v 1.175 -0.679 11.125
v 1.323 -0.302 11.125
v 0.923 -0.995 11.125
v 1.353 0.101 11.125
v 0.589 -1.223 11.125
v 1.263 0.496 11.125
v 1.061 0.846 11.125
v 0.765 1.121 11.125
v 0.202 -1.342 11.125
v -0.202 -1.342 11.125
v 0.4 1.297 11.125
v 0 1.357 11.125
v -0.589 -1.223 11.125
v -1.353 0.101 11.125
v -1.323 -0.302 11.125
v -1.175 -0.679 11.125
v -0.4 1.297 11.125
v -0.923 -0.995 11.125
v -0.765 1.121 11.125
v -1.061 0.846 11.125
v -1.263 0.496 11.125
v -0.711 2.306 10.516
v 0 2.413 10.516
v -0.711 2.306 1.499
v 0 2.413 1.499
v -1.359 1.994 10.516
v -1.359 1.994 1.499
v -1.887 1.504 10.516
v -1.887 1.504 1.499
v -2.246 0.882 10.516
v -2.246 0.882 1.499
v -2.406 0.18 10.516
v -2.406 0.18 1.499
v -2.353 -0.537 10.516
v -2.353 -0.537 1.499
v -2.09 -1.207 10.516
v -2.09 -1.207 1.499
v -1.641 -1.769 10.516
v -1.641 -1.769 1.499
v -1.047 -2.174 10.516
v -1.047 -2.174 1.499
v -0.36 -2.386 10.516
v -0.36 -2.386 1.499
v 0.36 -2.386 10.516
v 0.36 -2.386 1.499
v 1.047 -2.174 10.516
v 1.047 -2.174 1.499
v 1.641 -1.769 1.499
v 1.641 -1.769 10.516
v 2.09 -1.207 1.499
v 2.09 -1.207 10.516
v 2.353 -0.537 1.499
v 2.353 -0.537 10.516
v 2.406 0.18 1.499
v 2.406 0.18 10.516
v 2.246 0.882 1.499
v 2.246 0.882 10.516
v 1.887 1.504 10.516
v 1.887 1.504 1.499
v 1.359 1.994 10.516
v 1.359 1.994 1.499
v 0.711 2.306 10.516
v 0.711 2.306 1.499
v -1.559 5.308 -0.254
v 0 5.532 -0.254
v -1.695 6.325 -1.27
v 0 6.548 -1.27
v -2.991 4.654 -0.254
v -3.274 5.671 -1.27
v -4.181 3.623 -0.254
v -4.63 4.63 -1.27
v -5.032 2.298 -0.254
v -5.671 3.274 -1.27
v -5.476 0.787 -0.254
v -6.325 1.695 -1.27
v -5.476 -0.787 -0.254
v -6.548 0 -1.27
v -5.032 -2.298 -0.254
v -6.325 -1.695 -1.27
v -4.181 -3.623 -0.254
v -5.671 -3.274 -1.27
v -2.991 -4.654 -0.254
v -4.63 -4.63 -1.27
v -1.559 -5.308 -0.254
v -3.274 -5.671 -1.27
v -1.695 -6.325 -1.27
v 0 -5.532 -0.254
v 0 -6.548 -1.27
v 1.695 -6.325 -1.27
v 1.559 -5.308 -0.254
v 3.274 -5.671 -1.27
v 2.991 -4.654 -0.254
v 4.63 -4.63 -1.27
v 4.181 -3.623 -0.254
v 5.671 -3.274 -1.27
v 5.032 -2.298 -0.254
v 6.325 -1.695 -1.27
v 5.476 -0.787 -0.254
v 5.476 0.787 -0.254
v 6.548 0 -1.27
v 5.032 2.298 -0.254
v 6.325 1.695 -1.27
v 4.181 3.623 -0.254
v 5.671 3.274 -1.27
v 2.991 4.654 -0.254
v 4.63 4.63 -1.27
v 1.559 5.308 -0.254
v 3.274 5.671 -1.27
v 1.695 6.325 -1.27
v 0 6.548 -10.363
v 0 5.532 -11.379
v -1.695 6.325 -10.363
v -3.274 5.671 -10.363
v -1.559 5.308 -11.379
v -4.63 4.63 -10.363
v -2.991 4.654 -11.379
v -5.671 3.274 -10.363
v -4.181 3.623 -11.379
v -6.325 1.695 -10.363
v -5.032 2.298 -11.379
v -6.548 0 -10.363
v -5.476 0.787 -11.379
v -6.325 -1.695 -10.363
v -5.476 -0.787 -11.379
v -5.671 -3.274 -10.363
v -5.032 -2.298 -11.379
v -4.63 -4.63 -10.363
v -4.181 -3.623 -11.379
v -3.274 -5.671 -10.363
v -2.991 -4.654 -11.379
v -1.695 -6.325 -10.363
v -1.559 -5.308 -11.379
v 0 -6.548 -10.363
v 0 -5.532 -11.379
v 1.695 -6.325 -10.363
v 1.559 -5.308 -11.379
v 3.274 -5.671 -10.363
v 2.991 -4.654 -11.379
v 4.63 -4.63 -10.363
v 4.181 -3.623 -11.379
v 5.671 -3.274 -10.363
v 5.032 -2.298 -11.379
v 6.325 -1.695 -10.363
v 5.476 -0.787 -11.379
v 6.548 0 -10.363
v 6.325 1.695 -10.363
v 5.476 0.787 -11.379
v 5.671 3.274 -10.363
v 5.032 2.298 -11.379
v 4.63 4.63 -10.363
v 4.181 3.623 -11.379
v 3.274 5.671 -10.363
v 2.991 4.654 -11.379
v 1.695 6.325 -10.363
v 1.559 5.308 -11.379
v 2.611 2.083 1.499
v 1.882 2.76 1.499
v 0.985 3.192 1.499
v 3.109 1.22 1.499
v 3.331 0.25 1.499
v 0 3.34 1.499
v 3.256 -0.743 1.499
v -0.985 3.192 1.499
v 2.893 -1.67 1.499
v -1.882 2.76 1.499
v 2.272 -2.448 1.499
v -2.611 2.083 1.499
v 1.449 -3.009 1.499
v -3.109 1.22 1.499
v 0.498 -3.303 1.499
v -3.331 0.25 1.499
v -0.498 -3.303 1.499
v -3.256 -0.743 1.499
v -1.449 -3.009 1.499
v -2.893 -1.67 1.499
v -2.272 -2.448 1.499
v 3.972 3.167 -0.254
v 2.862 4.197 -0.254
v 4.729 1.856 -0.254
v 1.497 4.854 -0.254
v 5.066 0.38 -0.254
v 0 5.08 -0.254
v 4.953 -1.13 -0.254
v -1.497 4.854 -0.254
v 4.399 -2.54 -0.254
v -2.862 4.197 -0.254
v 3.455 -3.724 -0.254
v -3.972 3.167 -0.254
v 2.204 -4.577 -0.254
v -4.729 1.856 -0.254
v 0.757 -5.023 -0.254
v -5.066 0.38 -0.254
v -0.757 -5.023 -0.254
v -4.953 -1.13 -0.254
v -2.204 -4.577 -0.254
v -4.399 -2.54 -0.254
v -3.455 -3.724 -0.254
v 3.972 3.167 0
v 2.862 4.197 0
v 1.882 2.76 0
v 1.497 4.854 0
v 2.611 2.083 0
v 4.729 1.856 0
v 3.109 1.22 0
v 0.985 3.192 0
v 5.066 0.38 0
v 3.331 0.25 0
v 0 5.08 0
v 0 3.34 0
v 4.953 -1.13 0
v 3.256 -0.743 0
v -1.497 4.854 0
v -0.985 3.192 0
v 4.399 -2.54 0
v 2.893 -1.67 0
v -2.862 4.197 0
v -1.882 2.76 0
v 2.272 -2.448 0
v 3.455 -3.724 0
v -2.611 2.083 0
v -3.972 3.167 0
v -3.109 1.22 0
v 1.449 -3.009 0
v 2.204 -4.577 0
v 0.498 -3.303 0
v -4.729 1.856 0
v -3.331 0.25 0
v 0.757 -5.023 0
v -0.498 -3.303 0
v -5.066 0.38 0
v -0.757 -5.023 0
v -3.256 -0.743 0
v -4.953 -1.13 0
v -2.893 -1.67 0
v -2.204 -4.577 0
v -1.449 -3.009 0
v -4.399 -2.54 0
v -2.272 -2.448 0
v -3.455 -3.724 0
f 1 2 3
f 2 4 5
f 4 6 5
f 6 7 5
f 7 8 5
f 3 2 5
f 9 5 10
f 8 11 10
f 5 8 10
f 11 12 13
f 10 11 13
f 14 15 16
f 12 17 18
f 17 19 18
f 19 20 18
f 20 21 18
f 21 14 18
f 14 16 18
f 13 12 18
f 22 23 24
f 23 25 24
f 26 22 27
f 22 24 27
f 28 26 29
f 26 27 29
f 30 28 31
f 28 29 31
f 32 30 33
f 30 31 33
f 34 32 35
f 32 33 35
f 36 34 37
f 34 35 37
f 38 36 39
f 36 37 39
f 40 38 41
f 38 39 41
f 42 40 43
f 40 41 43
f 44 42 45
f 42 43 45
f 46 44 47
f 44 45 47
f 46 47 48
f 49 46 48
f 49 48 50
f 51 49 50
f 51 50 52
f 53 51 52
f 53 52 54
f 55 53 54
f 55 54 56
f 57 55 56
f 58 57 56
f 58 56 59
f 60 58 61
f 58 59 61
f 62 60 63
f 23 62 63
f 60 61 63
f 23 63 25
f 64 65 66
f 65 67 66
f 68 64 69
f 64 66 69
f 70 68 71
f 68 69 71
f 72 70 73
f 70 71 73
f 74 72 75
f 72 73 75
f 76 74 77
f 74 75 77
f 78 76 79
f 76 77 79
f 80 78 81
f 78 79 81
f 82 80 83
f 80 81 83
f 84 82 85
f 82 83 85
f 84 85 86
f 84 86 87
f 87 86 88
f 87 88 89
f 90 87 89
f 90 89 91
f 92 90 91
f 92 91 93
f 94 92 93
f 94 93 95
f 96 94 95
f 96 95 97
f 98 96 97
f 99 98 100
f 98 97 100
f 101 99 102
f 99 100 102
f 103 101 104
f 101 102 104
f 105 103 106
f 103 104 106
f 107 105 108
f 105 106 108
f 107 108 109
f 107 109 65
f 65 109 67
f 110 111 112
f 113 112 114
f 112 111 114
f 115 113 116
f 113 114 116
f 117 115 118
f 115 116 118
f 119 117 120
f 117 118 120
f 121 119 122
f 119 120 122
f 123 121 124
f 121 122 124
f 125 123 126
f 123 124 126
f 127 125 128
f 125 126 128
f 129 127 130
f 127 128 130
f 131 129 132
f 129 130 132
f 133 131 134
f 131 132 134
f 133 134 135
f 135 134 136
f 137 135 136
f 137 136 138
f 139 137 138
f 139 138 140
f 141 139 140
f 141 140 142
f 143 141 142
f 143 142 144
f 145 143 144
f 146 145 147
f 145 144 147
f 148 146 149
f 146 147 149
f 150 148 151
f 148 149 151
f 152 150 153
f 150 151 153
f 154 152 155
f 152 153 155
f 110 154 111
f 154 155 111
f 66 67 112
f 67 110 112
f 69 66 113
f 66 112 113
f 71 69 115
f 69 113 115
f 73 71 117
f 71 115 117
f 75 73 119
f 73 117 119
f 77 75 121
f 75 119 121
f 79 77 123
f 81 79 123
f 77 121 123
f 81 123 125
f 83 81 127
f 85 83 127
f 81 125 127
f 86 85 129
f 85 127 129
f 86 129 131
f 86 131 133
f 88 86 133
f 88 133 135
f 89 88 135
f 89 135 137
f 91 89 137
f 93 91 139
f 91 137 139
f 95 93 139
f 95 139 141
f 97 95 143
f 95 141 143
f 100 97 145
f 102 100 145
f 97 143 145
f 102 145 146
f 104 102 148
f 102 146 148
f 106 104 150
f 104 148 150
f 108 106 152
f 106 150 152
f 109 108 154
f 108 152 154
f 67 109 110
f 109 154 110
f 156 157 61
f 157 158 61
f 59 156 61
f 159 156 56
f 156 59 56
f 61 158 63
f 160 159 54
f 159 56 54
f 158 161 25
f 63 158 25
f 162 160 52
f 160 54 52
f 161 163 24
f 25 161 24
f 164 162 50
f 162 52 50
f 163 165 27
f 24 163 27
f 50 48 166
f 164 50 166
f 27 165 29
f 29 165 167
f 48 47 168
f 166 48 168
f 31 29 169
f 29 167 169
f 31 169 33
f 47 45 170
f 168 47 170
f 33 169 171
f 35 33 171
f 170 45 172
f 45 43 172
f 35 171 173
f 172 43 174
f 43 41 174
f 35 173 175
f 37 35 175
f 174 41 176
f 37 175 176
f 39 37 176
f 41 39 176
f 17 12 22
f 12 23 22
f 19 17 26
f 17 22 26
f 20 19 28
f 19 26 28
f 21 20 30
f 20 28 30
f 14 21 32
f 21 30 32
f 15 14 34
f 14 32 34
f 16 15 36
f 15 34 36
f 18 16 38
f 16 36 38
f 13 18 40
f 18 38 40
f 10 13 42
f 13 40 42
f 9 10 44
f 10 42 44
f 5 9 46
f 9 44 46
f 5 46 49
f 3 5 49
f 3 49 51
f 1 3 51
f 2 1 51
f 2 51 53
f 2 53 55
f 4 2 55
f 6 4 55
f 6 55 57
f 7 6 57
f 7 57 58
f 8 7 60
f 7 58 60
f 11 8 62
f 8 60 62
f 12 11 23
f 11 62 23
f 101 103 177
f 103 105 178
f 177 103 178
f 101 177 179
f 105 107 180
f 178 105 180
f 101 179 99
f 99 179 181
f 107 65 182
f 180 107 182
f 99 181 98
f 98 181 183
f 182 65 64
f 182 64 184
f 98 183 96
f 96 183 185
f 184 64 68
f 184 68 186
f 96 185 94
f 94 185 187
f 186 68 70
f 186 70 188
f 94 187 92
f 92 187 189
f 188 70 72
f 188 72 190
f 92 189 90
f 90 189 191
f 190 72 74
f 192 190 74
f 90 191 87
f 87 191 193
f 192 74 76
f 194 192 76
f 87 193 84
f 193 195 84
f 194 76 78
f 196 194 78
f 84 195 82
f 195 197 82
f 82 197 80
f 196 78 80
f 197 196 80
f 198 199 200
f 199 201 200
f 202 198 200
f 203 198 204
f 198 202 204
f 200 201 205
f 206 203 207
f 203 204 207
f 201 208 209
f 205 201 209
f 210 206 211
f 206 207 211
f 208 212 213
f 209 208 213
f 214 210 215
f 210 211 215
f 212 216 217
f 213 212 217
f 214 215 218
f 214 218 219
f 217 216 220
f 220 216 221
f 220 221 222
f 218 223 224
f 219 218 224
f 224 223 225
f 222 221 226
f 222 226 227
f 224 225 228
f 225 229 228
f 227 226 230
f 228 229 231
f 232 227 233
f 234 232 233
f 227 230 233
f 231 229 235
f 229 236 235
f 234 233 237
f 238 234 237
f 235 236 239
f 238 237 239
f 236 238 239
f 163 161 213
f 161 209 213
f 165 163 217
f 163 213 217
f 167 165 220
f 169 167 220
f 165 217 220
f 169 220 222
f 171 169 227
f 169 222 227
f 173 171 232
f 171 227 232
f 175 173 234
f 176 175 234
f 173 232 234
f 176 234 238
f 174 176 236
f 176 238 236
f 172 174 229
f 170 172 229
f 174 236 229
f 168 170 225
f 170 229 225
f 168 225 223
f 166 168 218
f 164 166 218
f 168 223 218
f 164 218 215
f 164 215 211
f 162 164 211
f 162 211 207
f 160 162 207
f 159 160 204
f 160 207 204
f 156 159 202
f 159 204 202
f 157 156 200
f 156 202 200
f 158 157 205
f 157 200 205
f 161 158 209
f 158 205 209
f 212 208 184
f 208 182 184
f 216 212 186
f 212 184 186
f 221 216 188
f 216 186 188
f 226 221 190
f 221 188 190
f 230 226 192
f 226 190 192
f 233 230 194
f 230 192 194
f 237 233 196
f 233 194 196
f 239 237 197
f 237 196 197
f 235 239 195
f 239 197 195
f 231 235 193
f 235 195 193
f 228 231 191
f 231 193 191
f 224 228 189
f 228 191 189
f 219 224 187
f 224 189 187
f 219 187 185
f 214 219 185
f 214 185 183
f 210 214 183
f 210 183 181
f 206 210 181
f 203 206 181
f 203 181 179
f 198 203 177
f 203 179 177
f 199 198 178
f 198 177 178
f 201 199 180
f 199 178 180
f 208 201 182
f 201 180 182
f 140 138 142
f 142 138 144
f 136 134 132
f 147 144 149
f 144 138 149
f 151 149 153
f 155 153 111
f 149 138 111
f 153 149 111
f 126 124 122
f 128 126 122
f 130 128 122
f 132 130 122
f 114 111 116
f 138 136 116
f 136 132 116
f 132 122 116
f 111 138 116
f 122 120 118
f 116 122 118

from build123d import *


with BuildPart() as part:
    # Sketch1 → Revolve1 (revolve)
    with BuildSketch(Plane(origin=(0, 0, 0), x_dir=(0, 0, -1), z_dir=(1, 0, 0))):
        Polygon((-1.4986, 2.413), (-1.4986, 3.3401), (0, 3.3401), (0, 5.08), (0.254, 5.08), (0.254, 5.5324375), (1.27, 6.5484375), (10.3632, 6.5484375), (11.3792, 5.5324375), (11.3792, 0), (-11.1252, 0), (-11.1252, 1.357141828), (-10.5156, 2.413), align=None)
    revolve(axis=Axis((0, 0, 11.1252), (0, 0, 1)))


solid = part.part
